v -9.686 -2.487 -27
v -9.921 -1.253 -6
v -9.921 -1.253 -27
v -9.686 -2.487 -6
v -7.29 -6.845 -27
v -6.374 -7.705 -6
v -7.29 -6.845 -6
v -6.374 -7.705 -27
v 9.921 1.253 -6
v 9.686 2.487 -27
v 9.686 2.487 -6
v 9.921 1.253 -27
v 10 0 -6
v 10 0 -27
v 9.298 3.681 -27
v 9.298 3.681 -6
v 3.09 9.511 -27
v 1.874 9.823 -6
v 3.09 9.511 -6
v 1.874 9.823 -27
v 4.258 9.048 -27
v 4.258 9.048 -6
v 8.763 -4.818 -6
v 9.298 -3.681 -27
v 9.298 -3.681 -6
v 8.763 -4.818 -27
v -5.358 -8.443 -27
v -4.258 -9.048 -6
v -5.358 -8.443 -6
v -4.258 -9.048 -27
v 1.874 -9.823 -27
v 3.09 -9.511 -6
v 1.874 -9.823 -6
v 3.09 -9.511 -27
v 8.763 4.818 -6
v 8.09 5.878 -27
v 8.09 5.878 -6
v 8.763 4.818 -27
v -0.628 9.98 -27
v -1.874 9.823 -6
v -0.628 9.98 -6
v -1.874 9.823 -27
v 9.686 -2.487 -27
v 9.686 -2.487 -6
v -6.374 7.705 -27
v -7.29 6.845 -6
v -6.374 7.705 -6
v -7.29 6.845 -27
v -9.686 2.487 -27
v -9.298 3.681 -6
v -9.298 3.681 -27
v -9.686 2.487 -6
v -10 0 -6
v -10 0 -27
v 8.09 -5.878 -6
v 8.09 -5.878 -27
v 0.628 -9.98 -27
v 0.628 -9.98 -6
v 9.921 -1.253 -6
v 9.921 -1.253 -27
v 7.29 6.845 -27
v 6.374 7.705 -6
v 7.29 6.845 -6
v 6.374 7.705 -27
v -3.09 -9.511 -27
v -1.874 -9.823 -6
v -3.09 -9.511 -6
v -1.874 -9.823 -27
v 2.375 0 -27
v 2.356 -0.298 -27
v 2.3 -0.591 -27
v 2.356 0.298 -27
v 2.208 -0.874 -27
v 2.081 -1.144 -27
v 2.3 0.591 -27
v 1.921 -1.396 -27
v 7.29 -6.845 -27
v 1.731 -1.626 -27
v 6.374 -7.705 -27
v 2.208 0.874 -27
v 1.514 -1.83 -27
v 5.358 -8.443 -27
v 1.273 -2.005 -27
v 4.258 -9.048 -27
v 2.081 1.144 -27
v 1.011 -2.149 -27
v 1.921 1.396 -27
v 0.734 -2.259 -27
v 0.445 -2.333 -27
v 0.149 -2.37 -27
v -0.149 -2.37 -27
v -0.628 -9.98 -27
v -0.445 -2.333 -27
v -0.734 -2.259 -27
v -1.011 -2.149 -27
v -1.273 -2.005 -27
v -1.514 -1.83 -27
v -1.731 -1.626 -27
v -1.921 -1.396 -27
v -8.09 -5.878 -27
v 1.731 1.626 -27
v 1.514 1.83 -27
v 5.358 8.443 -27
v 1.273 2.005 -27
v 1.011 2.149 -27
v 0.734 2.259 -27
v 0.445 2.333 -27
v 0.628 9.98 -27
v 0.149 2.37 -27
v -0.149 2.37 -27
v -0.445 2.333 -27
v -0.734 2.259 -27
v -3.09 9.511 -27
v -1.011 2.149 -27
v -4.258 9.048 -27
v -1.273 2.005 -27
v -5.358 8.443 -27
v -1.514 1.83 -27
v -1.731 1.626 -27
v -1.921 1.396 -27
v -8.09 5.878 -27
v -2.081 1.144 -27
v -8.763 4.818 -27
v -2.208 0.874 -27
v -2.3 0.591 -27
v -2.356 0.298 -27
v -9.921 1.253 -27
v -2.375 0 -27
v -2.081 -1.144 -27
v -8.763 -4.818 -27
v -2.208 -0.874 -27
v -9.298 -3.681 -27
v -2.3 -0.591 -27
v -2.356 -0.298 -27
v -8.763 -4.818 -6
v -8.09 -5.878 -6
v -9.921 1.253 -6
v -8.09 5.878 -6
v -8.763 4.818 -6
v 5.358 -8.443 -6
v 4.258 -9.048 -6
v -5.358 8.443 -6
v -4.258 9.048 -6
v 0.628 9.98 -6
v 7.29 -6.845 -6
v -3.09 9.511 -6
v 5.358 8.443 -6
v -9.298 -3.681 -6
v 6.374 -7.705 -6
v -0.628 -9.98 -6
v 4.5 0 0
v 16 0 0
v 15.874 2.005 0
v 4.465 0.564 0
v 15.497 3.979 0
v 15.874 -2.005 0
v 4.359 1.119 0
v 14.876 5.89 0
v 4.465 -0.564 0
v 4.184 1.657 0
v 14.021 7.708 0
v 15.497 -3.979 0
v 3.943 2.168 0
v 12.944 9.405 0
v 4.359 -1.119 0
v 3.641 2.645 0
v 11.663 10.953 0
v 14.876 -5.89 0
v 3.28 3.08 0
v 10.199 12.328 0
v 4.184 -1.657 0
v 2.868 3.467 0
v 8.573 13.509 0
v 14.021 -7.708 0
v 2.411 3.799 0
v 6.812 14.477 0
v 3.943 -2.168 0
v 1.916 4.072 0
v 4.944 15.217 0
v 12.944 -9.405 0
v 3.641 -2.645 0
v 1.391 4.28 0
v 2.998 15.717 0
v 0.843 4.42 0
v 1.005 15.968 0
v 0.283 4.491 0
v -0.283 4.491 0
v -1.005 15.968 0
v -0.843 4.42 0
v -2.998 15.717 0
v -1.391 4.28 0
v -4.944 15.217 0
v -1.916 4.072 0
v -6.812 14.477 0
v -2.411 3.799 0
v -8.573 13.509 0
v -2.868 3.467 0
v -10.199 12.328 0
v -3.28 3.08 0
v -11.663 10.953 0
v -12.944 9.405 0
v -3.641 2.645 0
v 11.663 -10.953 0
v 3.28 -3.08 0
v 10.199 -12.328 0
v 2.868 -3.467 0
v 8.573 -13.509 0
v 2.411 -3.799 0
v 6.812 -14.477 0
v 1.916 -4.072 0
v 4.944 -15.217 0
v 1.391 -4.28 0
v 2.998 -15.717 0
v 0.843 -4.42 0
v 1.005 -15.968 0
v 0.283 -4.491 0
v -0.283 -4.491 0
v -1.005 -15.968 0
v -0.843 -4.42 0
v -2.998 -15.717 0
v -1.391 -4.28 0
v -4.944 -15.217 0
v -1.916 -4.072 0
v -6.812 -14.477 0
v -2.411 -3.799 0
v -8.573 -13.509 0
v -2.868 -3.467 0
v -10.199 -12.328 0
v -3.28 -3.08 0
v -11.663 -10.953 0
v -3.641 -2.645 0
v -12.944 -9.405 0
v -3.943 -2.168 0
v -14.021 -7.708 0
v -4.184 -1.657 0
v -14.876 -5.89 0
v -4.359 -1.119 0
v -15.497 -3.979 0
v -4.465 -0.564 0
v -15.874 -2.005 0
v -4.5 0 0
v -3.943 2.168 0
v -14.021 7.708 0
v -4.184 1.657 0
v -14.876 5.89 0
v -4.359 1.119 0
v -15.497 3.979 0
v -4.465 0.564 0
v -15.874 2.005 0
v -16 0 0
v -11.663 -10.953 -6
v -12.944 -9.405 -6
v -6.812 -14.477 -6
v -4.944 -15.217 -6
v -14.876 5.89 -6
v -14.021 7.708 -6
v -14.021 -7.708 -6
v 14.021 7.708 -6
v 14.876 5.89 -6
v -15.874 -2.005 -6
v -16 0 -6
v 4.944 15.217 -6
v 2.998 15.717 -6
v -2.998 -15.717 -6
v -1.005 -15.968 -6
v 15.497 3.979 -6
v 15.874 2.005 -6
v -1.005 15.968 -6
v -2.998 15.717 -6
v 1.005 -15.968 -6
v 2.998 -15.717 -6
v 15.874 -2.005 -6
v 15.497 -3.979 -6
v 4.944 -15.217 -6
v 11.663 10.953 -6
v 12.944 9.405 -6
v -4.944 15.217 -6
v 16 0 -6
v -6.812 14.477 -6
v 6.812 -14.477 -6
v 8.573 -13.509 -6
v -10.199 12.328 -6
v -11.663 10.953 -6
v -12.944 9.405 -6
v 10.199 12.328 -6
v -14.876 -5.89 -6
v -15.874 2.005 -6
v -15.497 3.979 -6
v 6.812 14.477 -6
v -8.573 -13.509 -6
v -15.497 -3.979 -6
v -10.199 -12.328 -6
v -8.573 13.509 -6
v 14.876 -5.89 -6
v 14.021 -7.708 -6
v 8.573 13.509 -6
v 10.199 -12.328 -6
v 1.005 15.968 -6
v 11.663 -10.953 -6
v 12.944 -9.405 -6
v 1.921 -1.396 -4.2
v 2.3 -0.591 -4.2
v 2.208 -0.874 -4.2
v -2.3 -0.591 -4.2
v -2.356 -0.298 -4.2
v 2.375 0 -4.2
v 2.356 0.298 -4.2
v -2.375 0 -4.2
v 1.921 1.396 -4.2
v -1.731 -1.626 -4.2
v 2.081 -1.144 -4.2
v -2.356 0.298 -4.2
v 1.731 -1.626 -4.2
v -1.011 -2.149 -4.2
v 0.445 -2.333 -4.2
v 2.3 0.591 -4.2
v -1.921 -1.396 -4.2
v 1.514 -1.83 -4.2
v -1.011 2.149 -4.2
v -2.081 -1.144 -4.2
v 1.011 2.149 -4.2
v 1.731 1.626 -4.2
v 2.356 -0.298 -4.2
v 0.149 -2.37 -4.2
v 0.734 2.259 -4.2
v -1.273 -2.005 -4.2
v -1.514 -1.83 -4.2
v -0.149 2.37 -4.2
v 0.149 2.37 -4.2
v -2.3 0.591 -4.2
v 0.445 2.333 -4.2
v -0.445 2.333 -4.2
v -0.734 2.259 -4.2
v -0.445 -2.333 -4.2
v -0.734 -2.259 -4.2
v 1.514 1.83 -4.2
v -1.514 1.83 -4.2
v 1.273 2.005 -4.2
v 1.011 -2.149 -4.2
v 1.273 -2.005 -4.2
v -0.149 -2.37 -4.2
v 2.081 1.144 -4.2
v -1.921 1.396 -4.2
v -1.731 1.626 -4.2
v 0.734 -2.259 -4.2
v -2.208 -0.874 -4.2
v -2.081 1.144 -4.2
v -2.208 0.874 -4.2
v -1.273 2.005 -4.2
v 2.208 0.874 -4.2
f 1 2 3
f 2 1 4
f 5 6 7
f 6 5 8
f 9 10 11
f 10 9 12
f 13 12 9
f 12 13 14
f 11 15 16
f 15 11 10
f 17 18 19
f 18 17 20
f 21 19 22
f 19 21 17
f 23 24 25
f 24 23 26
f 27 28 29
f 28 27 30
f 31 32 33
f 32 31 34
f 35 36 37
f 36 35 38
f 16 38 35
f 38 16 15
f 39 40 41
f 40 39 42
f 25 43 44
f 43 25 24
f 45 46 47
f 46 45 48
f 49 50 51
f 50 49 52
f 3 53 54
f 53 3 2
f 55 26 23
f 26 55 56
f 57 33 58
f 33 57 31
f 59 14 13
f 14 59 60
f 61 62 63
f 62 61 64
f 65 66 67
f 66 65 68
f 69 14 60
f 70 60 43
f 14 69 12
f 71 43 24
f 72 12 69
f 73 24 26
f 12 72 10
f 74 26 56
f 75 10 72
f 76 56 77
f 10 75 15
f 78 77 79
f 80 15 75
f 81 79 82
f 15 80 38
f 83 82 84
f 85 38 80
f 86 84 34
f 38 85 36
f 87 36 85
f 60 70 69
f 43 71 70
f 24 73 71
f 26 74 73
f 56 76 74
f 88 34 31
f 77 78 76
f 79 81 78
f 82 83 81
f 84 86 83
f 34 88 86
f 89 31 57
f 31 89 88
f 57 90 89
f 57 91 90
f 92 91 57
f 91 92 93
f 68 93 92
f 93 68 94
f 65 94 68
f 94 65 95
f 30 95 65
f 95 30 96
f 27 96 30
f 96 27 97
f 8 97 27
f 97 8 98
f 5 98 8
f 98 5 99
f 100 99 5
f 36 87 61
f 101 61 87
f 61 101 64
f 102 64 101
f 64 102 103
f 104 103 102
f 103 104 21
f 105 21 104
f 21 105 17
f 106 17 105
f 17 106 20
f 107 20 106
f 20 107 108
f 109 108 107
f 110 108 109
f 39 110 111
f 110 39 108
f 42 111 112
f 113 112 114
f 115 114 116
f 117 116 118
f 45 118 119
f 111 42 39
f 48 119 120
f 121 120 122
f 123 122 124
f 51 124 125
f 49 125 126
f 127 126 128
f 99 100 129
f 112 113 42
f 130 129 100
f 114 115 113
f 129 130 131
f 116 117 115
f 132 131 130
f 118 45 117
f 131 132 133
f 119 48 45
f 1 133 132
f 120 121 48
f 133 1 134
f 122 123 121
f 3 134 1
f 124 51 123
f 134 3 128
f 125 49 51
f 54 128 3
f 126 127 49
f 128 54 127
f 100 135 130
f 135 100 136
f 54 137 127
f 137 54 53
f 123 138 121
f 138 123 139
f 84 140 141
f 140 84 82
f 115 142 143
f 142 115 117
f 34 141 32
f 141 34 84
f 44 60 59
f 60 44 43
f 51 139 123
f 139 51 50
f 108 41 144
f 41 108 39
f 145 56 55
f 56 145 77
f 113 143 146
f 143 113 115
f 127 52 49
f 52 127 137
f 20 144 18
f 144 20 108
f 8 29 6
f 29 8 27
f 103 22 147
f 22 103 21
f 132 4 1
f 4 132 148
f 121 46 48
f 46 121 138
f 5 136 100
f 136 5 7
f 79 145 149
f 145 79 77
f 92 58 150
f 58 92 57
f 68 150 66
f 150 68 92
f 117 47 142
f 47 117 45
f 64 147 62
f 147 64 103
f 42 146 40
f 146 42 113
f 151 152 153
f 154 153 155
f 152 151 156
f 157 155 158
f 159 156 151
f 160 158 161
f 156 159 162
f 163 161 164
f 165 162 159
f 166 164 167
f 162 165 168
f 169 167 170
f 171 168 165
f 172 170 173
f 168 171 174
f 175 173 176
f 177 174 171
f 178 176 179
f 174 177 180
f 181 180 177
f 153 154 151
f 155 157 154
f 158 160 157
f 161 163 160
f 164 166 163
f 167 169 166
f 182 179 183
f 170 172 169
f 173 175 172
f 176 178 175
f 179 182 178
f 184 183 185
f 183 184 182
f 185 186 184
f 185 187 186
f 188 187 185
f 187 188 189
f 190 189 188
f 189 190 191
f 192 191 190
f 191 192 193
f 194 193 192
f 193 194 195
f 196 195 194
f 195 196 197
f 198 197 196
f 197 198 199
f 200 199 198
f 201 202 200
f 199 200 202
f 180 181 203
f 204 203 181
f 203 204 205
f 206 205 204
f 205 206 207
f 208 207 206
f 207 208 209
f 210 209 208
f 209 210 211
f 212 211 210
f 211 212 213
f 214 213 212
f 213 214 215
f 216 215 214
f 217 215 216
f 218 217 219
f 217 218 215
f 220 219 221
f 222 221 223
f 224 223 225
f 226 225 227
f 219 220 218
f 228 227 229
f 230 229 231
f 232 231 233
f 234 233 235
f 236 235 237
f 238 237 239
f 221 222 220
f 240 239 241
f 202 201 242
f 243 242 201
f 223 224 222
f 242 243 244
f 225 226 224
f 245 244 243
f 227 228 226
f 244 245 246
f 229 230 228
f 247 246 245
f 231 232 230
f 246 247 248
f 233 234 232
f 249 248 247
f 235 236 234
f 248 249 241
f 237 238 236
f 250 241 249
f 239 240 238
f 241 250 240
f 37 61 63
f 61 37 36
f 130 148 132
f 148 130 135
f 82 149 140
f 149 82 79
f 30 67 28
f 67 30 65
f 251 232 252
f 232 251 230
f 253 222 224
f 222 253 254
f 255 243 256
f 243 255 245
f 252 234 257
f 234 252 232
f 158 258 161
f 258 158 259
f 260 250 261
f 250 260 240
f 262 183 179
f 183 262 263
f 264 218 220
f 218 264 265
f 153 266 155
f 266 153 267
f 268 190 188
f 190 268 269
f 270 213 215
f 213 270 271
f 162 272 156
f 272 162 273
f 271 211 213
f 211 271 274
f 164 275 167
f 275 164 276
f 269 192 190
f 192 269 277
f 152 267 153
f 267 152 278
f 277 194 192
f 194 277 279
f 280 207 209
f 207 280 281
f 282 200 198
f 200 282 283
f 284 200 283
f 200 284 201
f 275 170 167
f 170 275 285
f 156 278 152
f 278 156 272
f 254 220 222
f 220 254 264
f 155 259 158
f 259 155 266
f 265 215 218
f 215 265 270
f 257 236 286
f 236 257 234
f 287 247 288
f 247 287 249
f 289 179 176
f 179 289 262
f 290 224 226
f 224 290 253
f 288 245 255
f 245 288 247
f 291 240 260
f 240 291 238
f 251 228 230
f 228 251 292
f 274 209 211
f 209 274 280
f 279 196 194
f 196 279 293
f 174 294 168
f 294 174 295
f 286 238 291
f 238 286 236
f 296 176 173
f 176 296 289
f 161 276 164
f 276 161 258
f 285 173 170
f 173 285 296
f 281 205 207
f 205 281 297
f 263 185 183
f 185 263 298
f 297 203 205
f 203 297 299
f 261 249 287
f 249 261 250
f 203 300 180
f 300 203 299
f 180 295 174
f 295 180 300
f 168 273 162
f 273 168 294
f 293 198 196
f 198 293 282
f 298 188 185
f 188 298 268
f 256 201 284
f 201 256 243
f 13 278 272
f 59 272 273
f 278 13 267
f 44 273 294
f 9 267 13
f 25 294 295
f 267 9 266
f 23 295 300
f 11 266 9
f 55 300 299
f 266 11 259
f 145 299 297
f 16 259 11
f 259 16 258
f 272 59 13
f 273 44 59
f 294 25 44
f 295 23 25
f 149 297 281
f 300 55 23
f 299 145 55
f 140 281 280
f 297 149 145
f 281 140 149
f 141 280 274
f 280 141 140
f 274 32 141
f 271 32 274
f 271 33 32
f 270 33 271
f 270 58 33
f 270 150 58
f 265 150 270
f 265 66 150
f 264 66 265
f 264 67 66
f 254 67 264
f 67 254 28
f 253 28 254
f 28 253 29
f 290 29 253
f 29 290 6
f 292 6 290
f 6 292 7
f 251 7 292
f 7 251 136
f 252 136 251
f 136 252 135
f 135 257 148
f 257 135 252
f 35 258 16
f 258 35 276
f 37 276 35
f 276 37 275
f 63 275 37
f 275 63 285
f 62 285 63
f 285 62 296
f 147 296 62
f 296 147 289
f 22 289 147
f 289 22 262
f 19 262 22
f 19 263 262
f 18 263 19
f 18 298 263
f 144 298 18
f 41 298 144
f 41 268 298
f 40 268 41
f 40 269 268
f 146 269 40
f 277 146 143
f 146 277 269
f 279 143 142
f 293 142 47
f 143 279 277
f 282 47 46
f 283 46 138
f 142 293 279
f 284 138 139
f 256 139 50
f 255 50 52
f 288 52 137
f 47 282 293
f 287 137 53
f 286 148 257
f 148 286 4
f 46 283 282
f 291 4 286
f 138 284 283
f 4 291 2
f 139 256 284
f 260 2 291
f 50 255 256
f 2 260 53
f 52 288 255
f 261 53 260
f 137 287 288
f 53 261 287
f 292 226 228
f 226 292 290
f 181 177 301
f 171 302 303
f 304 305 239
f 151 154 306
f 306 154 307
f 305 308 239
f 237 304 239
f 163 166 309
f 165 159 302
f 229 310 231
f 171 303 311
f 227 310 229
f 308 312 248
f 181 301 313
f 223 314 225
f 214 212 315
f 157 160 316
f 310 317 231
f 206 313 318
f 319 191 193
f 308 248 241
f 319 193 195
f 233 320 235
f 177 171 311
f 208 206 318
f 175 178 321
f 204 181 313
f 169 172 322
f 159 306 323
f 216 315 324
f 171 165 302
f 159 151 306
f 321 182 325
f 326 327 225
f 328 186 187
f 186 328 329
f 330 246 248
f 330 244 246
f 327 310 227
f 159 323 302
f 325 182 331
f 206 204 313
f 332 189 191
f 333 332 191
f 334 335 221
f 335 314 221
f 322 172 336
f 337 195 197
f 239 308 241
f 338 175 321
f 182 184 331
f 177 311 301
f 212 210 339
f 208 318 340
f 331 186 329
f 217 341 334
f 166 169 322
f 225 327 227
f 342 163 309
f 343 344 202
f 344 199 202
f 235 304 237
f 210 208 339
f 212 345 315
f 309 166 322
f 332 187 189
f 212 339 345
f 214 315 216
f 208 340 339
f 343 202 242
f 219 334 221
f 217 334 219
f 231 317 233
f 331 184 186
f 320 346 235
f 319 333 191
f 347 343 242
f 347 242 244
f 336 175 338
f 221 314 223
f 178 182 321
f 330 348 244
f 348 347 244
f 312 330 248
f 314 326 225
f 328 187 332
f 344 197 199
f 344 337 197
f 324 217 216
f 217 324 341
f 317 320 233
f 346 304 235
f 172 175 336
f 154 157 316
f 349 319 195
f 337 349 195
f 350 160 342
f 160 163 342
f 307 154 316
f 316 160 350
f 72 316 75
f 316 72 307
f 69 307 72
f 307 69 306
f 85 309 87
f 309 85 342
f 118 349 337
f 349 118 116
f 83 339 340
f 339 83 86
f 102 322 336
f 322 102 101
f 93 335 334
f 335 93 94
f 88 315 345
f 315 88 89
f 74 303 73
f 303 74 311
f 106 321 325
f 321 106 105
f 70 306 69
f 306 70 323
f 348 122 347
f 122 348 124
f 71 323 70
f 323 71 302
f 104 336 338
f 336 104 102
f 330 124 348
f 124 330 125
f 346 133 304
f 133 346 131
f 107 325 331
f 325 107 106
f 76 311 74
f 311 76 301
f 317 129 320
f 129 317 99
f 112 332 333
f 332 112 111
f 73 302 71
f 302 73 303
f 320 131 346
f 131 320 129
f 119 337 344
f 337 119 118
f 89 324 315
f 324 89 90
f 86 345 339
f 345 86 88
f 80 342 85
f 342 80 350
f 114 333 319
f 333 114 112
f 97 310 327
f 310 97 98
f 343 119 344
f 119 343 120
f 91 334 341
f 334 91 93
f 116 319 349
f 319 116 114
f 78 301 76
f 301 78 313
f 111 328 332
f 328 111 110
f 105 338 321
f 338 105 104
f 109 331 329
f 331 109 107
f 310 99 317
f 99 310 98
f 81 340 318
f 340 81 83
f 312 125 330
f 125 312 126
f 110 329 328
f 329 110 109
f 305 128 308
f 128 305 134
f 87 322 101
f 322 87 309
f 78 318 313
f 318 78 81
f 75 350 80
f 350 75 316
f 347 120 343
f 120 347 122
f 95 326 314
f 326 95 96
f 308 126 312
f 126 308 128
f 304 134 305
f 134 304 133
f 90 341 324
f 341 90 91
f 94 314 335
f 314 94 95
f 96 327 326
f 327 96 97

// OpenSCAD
$fn = 50;


difference() {
	union() {
		translate(v = [0, 0, -27.0000000000]) {
			cylinder(h = 27, r = 10.0000000000);
		}
		translate(v = [0, 0, -6.0000000000]) {
			cylinder(h = 6, r = 16.0000000000);
		}
	}
	union() {
		translate(v = [0, 0, 0]) {
			rotate(a = [0, 0, 0]) {
				difference() {
					union() {
						#translate(v = [0, 0, -27.0000000000]) {
							cylinder(h = 27, r = 2.2500000000);
						}
						#translate(v = [0, 0, -4.2000000000]) {
							cylinder(h = 4.2000000000, r = 10.0000000000, r1 = 2.3750000000, r2 = 4.5000000000);
						}
						#translate(v = [0, 0, -27.0000000000]) {
							cylinder(h = 27, r = 2.3750000000);
						}
						#translate(v = [0, 0, -27.0000000000]) {
							cylinder(h = 27, r = 2.2500000000);
						}
					}
					union();
				}
			}
		}
	}
}
